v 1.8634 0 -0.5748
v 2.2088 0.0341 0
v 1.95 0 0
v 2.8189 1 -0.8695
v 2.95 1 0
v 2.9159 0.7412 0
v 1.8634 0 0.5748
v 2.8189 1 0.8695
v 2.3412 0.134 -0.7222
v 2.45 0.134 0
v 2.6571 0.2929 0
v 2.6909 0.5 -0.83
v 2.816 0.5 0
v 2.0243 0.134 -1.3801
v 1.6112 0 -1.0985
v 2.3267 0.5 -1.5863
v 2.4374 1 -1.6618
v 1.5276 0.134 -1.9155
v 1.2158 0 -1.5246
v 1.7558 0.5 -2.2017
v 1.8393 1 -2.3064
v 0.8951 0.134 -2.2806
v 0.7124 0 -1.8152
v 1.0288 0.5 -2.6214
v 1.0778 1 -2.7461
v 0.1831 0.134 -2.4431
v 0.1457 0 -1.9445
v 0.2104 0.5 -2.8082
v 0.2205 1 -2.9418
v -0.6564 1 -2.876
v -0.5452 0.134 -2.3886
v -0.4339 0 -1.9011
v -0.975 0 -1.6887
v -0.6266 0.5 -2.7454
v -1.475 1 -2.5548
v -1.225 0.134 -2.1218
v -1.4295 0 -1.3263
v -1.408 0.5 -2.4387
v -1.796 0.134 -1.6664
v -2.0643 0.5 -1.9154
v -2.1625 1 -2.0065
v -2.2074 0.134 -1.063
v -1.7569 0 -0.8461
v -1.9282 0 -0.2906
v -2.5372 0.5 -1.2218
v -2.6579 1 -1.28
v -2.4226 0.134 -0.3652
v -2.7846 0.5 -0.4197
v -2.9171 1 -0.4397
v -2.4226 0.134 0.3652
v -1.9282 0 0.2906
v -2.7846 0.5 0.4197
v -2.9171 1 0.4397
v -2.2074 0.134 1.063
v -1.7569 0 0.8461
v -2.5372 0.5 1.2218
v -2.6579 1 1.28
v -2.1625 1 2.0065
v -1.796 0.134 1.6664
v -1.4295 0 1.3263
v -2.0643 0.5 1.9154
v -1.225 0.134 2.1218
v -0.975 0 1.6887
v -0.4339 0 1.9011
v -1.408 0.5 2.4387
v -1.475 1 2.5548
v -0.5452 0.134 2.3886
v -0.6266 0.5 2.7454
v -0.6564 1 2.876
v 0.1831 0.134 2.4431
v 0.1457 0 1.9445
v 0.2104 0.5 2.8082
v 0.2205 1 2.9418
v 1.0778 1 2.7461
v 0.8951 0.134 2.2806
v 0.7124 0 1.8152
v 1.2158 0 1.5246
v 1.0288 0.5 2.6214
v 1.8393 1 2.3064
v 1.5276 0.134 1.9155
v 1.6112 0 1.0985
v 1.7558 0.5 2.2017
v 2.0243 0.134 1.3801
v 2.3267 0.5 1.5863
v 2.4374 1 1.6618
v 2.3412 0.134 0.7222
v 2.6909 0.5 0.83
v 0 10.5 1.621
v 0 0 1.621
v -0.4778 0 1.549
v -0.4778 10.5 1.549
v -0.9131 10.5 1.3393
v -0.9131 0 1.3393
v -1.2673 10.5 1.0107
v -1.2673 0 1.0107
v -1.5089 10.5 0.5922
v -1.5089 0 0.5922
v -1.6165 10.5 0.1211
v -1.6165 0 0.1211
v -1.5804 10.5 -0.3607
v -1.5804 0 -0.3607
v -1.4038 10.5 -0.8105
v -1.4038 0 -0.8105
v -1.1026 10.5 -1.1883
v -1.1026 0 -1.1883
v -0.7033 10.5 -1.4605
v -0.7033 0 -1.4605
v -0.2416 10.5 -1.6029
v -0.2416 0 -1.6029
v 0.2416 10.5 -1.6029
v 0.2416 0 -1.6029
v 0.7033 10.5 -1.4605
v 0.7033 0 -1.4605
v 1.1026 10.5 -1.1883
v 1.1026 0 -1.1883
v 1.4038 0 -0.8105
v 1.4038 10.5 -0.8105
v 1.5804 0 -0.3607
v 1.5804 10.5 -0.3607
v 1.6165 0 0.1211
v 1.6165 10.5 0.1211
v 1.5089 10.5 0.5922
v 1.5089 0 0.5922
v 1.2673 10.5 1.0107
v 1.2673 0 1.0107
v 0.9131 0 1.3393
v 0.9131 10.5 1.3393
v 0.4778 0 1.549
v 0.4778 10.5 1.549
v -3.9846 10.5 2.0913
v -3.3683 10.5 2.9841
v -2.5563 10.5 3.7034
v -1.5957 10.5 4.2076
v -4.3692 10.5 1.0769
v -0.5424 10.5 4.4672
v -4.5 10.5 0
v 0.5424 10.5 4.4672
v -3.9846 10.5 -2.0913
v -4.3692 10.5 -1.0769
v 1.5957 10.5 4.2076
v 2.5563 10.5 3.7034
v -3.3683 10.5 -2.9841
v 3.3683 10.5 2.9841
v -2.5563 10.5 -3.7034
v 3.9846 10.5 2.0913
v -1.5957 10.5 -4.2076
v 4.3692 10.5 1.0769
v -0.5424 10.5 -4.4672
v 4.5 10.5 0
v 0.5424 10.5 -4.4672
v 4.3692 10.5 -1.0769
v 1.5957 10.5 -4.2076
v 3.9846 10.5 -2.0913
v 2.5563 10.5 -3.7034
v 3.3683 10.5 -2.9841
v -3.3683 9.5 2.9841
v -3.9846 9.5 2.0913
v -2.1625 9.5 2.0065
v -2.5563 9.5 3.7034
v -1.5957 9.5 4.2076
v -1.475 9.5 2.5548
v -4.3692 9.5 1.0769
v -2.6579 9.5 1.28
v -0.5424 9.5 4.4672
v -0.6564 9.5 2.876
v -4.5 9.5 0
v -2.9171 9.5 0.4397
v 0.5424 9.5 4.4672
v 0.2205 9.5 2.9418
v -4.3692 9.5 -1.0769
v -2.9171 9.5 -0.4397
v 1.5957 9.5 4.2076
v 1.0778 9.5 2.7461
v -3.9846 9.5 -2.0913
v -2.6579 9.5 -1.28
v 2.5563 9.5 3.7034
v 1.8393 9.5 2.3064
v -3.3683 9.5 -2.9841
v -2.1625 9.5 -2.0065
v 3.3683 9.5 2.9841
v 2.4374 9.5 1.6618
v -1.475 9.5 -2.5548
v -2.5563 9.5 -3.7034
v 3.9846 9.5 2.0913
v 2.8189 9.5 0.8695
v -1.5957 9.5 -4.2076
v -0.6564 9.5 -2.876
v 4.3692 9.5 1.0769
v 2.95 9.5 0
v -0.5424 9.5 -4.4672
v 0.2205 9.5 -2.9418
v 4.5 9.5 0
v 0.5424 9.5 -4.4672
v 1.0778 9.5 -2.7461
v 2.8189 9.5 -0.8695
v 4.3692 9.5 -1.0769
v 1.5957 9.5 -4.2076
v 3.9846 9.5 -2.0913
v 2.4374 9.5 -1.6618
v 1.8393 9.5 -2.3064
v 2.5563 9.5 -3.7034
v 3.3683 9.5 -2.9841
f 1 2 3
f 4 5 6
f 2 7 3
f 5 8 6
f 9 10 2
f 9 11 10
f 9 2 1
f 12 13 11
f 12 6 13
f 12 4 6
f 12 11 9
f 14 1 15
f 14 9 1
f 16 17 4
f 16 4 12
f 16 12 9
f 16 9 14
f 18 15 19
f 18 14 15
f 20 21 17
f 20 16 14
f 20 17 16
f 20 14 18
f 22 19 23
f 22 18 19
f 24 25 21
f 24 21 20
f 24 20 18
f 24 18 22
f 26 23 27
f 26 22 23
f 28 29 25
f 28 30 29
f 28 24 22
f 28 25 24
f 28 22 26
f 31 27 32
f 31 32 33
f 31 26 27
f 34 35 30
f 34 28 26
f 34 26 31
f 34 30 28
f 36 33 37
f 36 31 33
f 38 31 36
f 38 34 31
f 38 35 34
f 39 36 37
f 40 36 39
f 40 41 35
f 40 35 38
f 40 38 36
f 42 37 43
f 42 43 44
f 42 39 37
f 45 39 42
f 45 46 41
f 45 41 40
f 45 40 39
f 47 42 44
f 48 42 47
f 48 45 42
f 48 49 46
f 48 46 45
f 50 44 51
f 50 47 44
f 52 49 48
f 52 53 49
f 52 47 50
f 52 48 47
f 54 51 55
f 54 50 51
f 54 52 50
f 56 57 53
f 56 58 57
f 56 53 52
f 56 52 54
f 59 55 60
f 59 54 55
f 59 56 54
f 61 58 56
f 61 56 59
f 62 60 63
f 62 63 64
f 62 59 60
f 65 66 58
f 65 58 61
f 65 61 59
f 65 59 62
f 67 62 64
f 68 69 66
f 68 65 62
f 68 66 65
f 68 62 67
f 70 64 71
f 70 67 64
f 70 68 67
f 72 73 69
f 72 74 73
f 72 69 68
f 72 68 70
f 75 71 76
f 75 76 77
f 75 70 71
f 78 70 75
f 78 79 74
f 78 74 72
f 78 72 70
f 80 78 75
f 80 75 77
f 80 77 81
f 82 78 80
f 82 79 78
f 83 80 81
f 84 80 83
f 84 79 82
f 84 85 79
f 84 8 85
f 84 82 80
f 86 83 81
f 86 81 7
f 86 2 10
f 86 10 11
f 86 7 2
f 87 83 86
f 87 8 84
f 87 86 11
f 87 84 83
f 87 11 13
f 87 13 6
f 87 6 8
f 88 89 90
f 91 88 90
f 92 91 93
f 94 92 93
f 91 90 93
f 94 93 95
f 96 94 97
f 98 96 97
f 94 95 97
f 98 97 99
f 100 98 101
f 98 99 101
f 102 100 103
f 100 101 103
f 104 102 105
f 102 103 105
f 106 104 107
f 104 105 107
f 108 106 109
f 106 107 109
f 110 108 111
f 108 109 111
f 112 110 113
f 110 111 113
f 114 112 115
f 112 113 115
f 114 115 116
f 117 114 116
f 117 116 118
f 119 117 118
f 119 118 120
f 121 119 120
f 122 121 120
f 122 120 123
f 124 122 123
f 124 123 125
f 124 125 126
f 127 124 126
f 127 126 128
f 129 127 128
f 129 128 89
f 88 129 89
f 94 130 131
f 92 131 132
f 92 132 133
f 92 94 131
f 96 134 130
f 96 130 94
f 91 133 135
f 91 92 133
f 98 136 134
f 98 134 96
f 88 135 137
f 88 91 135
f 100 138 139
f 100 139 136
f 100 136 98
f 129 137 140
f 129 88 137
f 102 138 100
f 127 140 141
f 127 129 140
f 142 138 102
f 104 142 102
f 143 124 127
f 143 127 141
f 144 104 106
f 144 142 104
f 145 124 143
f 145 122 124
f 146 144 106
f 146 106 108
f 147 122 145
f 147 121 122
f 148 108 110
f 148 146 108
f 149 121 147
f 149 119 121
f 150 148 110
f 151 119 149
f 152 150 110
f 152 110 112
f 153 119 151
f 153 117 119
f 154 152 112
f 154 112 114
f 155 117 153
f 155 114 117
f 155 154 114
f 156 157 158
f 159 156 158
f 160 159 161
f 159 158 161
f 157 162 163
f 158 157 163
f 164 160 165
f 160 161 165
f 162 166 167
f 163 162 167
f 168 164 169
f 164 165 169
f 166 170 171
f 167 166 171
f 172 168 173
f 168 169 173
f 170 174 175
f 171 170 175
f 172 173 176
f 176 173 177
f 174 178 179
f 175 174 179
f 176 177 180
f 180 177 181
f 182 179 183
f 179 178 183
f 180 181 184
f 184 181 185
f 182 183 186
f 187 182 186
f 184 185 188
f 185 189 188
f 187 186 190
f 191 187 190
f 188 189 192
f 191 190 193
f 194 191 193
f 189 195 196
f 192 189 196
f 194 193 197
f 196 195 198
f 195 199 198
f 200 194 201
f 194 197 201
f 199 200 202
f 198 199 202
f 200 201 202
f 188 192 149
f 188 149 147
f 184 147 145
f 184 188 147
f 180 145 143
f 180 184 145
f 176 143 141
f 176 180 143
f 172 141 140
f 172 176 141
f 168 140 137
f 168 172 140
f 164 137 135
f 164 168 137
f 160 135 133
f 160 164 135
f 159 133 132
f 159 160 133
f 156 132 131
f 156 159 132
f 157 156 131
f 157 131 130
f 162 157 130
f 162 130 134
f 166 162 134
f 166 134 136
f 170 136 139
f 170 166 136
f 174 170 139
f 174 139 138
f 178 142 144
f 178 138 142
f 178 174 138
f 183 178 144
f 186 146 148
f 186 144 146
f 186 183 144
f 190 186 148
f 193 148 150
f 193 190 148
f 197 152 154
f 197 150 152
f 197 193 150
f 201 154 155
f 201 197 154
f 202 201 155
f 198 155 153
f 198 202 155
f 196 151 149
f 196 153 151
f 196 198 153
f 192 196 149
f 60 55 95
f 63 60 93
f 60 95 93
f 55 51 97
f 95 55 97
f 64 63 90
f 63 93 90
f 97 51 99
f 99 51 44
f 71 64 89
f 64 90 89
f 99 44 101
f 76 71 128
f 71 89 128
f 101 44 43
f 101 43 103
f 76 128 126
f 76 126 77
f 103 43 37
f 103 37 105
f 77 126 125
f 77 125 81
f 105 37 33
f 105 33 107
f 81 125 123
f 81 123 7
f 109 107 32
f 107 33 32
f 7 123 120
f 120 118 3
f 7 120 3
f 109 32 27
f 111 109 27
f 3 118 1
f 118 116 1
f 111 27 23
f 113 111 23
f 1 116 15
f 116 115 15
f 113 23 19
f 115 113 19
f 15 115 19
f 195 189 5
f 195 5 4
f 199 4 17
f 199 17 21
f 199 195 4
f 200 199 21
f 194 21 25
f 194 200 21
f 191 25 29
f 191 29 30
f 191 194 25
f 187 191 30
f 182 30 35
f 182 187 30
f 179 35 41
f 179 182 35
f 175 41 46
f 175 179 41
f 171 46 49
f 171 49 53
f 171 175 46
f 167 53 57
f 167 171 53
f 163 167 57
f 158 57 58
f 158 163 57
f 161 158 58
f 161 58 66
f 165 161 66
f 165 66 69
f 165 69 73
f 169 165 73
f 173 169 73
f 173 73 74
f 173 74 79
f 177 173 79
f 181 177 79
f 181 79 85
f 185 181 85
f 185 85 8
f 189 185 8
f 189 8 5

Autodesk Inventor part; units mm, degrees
ref_plane "YZ Plane" through (0, 0, 0) normal (1, 0, 0) x (0, 1, 0)
ref_plane "XZ Plane" through (0, 0, 0) normal (0, 1, 0) x (-1, 0, 0)
ref_plane "XY Plane" through (0, 0, 0) normal (0, 0, 1) x (1, 0, 0)
sketch "Sketch1" plane through (0, 0, 0) normal (0, 0, 1) x (1, 0, 0)
  line L0 (0, 0) -> (2.95, 0)
  line L1 (2.95, 0) -> (2.95, 9.5)
  line L2 (0, 0) -> (0, 10.5)
  line L3 (0, 10.5) -> (4.5, 10.5)
  line L4 (4.5, 10.5) -> (4.5, 9.5)
  line L5 (4.5, 9.5) -> (2.95, 9.5)
  dimension "d0" = 2.95
  dimension "d1" = 9.5
  dimension "d2" = 10.5
  dimension "d3" = 4.5
revolve "Revolution1" add sketch "Sketch1" angle 360 about axis through (0, 0, 0) along (0, 1, 0)
sketch "Sketch2" plane through (0, 10.5, 0) normal (0, 1, 0) x (1, 0, 0)
  point P0 (0, 0)
  point P1 (0, 0)
hole "Hole1" at (0, 10.5, 0) direction (0, -1, 0) diameter 3.242 end through all thread size "M4x0.7" class "6H" standard "ISO Metric profile"
fillet "Fillet1" radius 1 1 edges at (-2.95, 0, 0)
properties part number "M4 Rivet nut" material "Brass, Soft Yellow, Welded"
